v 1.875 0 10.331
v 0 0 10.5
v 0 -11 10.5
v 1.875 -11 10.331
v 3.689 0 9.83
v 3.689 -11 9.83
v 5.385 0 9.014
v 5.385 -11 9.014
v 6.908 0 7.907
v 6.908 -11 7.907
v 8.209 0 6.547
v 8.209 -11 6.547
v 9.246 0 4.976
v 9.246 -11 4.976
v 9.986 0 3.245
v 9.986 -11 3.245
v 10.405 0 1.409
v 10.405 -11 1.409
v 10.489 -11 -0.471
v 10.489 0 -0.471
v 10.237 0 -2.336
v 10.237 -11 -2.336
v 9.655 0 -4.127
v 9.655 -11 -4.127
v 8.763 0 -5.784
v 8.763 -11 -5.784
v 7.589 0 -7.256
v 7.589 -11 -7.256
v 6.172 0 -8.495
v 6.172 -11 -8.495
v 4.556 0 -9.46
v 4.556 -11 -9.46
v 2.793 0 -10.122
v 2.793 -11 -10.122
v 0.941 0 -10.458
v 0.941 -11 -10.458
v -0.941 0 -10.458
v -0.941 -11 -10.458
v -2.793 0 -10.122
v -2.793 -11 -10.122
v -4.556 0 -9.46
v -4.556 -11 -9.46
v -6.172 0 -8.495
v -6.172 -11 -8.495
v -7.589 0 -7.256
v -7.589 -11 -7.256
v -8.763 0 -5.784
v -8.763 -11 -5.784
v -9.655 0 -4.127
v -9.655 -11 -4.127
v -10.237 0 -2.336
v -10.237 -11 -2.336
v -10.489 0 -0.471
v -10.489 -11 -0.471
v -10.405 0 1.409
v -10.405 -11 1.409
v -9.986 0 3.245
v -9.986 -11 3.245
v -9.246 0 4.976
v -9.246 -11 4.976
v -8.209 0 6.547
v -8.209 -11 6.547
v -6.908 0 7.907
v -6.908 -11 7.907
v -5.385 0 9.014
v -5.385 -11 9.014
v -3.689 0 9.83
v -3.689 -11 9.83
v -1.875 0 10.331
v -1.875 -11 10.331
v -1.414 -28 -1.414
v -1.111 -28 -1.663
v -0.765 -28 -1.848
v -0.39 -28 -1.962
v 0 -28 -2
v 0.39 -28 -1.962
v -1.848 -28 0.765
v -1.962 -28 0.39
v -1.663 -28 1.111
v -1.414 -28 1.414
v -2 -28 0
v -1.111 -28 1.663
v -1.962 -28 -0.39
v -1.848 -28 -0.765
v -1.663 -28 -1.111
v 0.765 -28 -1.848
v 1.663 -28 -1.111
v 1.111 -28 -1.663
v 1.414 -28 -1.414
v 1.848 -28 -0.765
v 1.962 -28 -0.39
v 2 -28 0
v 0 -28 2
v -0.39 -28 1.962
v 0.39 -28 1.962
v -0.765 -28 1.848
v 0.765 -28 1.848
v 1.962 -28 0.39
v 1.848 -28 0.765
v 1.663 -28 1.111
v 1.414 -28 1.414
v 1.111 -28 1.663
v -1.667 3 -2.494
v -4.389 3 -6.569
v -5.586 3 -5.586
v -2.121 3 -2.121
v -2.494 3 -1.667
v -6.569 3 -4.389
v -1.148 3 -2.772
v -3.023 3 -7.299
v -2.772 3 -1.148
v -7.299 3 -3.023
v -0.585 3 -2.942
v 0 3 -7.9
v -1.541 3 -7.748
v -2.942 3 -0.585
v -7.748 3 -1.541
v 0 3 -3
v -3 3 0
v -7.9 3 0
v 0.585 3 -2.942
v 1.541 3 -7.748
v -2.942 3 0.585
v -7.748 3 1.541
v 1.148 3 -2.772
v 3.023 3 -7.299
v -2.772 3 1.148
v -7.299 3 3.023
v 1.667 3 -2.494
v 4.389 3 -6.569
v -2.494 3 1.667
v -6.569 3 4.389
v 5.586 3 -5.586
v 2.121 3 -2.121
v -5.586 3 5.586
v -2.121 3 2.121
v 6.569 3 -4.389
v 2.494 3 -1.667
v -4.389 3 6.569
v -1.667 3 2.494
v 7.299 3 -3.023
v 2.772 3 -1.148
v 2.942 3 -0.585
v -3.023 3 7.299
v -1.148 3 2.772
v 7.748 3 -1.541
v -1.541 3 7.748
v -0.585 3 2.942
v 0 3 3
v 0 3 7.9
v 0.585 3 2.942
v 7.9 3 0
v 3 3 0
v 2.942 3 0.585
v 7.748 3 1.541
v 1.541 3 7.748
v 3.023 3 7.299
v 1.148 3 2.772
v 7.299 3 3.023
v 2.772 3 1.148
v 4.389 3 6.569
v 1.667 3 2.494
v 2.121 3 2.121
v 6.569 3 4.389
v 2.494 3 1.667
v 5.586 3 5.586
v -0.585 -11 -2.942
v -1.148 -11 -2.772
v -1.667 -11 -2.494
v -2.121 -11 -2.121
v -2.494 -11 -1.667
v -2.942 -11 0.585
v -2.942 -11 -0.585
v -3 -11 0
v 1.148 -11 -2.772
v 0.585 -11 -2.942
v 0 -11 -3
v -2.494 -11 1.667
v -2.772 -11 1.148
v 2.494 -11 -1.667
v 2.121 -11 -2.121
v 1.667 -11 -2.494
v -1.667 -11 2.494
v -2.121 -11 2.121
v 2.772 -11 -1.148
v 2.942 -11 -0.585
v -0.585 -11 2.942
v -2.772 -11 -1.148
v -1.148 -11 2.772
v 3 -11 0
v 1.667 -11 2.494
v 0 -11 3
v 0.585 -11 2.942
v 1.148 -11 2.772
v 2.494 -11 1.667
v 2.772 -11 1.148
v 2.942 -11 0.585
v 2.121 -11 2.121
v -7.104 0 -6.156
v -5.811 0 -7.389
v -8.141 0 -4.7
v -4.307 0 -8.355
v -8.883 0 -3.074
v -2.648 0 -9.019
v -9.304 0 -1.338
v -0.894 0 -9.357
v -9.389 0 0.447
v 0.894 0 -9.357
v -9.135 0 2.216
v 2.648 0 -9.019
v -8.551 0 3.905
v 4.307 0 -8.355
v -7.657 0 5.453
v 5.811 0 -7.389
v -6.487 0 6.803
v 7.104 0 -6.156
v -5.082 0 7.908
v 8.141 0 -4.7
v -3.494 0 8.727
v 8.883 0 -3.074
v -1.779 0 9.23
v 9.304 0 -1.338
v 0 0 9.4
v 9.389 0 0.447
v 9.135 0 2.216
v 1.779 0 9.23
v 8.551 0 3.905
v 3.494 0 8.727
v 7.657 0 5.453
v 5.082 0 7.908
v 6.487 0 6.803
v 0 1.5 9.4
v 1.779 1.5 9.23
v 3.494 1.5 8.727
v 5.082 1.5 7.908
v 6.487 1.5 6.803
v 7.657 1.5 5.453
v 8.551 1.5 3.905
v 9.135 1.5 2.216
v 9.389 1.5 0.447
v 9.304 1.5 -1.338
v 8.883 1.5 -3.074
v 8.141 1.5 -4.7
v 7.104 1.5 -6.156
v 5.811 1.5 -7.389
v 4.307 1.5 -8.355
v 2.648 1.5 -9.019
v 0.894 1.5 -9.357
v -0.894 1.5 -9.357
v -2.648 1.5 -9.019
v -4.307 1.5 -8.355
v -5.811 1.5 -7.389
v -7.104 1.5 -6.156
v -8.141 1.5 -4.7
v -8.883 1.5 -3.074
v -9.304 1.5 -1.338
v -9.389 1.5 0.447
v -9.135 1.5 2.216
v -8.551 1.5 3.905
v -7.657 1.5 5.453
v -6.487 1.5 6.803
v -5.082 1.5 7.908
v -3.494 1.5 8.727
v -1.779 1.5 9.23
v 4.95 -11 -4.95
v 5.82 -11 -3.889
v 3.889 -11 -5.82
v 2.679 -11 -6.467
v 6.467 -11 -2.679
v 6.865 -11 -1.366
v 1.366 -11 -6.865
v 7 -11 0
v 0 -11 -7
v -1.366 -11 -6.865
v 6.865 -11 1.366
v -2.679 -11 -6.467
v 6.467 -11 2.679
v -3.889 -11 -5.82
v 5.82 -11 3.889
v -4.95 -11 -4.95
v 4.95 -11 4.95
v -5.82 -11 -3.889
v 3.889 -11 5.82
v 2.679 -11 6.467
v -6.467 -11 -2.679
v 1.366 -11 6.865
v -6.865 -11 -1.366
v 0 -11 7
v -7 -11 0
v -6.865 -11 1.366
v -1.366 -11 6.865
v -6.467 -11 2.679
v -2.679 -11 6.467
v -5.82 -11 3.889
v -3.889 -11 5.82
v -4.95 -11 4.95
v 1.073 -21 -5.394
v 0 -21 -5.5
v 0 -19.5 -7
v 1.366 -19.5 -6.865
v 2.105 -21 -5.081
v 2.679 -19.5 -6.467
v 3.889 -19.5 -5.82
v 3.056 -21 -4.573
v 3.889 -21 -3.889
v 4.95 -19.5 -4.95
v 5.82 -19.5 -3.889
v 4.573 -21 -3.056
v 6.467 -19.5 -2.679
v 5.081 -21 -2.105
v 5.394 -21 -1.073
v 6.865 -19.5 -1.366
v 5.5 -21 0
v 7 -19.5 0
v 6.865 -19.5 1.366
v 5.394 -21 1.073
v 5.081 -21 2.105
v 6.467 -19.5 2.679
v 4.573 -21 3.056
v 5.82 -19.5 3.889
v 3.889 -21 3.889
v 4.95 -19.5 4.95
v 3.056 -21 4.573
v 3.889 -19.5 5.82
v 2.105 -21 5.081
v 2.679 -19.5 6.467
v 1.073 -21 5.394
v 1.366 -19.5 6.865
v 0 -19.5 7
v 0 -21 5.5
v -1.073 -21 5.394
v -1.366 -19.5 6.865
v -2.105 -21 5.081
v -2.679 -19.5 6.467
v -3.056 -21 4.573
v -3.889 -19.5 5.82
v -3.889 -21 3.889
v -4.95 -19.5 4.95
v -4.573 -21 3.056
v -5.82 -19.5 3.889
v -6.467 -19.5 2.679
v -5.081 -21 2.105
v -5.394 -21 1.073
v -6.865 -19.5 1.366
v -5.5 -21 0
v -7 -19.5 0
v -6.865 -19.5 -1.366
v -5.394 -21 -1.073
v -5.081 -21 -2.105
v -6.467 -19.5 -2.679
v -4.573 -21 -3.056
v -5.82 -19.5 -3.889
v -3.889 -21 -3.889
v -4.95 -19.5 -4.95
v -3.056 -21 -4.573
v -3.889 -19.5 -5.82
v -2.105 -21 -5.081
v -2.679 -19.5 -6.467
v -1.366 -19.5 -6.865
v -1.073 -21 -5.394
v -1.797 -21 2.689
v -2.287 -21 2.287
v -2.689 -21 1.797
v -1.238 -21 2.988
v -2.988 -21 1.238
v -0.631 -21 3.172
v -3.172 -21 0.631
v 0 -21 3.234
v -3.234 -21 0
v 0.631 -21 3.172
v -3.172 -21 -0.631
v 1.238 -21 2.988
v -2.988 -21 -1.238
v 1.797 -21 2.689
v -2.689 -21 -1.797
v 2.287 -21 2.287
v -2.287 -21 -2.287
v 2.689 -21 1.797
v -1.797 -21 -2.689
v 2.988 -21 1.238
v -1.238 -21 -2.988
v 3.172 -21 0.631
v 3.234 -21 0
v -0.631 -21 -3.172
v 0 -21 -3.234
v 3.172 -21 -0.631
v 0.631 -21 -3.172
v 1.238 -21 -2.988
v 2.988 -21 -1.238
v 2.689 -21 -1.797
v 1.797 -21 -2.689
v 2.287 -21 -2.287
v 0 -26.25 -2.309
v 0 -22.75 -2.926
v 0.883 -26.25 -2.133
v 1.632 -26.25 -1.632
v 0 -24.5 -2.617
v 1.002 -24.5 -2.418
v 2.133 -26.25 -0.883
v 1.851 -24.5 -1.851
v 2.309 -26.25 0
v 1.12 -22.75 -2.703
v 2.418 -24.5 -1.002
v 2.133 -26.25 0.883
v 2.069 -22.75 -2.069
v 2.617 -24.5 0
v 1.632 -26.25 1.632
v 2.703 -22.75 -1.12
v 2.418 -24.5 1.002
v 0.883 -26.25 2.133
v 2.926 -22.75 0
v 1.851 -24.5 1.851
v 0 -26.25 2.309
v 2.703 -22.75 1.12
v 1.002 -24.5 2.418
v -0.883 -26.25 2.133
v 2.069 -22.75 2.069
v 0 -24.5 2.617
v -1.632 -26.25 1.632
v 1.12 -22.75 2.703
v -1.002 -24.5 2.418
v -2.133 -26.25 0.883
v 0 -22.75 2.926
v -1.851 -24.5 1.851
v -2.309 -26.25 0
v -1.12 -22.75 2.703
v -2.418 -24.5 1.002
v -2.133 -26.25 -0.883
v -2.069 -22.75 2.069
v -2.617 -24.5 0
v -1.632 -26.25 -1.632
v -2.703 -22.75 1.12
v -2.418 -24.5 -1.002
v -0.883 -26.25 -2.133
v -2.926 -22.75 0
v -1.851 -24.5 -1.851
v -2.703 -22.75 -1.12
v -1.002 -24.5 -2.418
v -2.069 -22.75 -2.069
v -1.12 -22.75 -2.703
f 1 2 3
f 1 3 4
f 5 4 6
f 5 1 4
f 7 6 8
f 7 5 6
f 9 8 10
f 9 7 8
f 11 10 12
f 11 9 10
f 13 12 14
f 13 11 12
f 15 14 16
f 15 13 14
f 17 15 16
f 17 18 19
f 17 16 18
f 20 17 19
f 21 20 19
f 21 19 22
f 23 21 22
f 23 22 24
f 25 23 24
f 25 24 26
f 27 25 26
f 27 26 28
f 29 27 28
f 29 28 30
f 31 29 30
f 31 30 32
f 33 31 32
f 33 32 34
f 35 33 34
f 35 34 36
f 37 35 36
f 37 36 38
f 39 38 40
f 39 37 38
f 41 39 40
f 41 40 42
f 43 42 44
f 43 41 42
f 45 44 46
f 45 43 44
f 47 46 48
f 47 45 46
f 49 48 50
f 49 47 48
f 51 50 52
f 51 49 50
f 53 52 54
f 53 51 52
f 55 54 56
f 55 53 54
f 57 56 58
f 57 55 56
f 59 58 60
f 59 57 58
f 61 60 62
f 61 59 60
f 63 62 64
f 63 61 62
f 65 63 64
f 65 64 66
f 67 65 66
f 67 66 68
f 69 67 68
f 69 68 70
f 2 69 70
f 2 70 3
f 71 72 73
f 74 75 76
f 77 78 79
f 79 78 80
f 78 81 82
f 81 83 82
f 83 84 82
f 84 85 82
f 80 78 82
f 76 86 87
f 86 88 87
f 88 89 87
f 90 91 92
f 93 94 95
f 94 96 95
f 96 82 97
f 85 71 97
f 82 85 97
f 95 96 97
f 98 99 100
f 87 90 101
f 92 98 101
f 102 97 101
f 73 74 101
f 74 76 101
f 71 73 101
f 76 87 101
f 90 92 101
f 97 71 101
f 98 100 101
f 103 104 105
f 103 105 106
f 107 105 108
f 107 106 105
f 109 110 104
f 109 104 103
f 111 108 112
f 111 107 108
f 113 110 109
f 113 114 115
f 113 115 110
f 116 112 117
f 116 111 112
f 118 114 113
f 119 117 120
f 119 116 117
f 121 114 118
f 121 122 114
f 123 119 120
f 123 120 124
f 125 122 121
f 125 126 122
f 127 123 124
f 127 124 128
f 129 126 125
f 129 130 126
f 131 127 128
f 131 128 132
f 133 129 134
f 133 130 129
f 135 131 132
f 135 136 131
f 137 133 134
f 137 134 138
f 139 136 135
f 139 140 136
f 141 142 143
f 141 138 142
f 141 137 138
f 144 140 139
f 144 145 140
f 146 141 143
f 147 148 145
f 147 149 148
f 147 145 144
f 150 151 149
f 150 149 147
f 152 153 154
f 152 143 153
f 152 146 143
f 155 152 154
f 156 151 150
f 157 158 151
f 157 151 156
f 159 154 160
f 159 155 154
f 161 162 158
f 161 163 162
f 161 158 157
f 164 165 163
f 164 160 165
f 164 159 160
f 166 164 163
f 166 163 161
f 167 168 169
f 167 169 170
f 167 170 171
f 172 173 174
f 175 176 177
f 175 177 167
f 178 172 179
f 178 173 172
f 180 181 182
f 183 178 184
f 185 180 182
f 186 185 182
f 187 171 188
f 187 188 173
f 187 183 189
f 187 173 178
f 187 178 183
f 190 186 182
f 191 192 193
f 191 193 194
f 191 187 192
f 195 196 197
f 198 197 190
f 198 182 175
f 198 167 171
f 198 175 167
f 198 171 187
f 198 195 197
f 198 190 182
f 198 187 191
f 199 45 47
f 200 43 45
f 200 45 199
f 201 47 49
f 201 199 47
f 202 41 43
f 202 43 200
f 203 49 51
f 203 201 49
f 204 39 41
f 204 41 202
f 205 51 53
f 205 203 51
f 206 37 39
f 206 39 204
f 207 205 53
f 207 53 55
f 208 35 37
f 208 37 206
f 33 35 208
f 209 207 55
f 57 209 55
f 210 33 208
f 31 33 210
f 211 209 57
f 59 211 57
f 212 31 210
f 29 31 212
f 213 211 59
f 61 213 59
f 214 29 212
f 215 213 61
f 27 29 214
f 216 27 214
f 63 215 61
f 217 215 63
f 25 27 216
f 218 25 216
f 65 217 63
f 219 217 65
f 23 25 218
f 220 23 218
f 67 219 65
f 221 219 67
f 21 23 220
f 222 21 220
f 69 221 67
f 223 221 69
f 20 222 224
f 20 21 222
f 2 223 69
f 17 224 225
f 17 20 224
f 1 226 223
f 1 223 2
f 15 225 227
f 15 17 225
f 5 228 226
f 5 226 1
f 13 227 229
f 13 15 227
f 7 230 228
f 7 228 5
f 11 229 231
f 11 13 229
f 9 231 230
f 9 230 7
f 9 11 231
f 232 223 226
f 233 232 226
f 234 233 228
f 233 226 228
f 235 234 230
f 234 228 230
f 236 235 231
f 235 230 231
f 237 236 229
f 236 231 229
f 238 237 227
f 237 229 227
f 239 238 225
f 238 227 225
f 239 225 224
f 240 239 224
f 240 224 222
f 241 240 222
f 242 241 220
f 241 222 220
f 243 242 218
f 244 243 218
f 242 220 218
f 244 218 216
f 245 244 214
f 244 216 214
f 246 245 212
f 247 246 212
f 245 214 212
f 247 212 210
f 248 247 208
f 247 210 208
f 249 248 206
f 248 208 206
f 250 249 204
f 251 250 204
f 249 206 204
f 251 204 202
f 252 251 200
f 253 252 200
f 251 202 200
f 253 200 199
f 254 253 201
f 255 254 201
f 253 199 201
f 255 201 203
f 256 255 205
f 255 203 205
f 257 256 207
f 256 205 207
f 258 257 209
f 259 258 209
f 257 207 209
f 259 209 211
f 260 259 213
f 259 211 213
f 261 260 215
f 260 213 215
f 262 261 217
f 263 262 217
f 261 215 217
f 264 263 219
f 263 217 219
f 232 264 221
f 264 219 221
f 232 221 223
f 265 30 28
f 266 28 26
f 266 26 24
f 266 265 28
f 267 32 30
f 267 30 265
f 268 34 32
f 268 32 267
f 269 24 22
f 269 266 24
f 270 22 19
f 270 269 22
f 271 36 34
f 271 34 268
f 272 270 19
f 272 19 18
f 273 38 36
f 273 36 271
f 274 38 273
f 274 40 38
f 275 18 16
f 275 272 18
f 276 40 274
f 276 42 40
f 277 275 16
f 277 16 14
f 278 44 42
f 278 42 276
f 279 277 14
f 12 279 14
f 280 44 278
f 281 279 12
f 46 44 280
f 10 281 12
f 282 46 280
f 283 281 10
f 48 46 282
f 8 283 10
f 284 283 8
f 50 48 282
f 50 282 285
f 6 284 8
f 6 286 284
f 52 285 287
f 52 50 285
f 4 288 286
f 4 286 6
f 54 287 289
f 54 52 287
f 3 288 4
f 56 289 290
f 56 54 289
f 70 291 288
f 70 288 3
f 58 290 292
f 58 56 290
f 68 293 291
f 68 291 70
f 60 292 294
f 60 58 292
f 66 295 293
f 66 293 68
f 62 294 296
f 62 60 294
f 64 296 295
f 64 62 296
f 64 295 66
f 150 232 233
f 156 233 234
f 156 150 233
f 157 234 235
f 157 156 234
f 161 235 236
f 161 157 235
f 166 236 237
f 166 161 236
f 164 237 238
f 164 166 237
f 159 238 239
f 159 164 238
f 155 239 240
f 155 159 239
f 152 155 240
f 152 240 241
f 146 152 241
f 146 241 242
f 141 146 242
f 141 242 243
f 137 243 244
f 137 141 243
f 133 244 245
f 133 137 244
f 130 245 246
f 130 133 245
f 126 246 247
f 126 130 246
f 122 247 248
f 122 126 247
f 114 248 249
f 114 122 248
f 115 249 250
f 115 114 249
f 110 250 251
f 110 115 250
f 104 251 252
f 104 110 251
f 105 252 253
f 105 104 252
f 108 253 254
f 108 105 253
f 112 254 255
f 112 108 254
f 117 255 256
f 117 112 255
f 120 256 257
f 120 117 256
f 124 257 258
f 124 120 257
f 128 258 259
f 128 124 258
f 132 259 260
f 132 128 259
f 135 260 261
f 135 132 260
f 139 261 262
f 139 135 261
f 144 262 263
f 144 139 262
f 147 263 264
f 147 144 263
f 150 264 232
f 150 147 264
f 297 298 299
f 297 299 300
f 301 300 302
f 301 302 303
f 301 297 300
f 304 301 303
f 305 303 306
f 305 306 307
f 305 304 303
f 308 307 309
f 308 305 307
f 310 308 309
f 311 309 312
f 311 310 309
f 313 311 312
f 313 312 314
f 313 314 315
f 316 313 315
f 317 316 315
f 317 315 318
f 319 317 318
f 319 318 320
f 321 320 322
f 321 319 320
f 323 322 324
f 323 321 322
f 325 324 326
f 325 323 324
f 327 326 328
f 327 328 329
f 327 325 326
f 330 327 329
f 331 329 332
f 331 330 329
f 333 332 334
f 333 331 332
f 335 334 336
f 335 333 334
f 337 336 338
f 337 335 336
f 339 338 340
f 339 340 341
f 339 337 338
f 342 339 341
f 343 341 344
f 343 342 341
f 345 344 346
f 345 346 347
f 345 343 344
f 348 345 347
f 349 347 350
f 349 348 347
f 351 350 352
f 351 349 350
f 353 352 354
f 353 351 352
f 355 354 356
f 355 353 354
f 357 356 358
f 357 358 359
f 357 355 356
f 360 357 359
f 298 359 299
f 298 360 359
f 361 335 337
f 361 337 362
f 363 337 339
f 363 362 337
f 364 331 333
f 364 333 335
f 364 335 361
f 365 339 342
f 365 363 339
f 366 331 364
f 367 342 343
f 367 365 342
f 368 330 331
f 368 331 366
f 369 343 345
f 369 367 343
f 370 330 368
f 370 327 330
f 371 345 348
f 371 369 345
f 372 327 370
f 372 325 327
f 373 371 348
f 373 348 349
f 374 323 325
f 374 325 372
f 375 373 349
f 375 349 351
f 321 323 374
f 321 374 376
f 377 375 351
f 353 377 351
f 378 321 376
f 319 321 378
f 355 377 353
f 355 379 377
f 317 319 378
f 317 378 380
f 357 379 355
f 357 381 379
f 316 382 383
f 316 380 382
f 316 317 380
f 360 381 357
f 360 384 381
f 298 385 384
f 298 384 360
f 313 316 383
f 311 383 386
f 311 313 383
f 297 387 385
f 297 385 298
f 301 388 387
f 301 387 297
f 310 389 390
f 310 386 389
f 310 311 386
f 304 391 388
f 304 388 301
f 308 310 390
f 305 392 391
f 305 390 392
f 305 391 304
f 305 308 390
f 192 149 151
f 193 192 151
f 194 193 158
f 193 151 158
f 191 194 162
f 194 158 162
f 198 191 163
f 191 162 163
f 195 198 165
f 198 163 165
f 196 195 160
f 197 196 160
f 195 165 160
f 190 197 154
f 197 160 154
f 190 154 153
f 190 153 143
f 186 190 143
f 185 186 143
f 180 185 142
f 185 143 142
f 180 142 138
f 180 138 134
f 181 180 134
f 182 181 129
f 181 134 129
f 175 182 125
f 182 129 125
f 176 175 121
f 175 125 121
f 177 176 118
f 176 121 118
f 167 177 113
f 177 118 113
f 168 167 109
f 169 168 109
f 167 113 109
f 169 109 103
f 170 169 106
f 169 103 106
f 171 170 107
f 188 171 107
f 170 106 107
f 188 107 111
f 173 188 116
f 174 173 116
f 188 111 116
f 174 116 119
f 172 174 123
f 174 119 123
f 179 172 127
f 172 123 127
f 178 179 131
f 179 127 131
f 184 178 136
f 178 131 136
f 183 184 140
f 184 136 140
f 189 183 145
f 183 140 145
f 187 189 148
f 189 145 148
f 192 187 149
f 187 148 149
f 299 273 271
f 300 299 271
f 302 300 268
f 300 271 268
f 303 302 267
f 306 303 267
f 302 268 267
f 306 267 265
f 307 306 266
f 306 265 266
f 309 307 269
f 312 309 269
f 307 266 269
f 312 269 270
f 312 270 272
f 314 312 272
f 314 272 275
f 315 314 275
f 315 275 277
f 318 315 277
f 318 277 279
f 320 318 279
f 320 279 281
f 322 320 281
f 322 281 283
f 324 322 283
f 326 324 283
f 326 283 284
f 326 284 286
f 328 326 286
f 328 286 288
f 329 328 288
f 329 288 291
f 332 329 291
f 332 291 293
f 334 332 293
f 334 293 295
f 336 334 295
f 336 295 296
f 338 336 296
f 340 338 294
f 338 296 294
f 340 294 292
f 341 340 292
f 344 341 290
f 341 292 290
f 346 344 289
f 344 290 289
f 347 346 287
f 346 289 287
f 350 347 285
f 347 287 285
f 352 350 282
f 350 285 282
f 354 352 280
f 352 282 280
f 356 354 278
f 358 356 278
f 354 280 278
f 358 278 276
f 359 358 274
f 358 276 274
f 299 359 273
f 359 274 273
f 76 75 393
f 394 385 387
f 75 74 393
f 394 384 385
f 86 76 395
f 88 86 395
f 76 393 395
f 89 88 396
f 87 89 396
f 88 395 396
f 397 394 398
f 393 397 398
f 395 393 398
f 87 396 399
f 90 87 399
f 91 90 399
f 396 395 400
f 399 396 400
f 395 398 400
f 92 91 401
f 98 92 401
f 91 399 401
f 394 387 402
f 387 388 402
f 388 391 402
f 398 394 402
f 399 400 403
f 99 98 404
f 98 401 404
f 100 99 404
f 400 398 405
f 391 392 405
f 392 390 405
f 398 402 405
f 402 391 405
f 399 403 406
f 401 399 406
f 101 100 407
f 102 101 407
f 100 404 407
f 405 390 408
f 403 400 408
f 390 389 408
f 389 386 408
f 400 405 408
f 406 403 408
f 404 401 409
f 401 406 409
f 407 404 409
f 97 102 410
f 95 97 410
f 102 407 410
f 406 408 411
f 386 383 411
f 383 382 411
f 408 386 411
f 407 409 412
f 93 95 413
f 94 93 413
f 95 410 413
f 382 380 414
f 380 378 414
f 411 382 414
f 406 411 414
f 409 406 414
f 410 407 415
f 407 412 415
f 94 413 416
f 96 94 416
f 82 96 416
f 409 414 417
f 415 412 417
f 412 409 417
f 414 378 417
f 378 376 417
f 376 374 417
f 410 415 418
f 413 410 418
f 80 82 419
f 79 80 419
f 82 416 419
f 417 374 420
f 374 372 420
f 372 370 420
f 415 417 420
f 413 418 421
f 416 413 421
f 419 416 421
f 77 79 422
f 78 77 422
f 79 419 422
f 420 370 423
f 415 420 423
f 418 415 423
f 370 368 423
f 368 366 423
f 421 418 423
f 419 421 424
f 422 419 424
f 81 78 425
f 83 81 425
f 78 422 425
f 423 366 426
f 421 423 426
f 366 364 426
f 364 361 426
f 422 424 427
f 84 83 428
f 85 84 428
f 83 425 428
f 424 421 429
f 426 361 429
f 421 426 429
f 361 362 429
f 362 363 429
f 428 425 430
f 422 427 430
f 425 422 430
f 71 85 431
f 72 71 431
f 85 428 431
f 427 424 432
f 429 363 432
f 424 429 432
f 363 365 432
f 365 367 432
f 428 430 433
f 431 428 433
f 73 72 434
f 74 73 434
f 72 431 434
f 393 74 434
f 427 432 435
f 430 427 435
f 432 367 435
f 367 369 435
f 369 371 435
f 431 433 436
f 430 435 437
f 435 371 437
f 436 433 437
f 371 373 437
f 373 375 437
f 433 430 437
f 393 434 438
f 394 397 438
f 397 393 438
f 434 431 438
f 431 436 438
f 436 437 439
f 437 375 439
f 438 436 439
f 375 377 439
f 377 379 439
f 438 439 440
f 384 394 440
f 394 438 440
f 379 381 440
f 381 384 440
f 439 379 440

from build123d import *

# Parameters (mm, degrees)
SKETCH_1_R          = 10.5
EXTRUDE_1_DEPTH     = 28
SKETCH_4_R          = 9.4
EXTRUDE_3_DEPTH     = 3
CHAMFER_2_SIZE      = 1.5
SKETCH_5_R          = 3
CUT_EXTRUDE_2_DEPTH = 14
CUT_EXTRUDE_START   = -17
SKETCH_6_R          = 10.5
SKETCH_6_R_2        = 7
CUT_EXTRUDE_3_DEPTH = 17
CUT_EXTRUDE_START_2 = -7
SKETCH_7_R          = 7
SKETCH_7_R_2        = 2
CUT_EXTRUDE_4_DEPTH = 7
CHAMFER_3_SIZE      = 1.5
DRAFT_3_ANGLE       = 10


with BuildPart() as part:
    # Эскиз1 → Бобышка-Вытянуть1 (new body)
    with BuildSketch(Plane(origin=(0, 0, 0), x_dir=(1, 0, 0), z_dir=(0, 1, 0))):
        with Locations(Location((0, 0, 0), (0, 0, 270))):
            Circle(SKETCH_1_R)
    extrude(amount=-EXTRUDE_1_DEPTH)

    # Эскиз4 → Бобышка-Вытянуть3 (add)
    with BuildSketch(Plane(origin=(0, 0, 0), x_dir=(1, 0, 0), z_dir=(0, 1, 0))):
        with Locations(Location((0, 0, 0), (0, 0, 270))):
            Circle(SKETCH_4_R)
    extrude(amount=EXTRUDE_3_DEPTH)

    # Фаска2
    chamfer_2_edges = [part.edges().sort_by_distance(p)[0] for p in [
        (0, 3, -9.4),
    ]]
    chamfer(chamfer_2_edges, length=CHAMFER_2_SIZE)

    # Эскиз5 → Вырез-Вытянуть2 (cut)
    with BuildSketch(Plane(origin=(0, 3, 0), x_dir=(1, 0, 0), z_dir=(0, 1, 0))):
        with Locations(Location((0, 0, 0), (0, 0, 270))):
            Circle(SKETCH_5_R)
    extrude(amount=-CUT_EXTRUDE_2_DEPTH, mode=Mode.SUBTRACT)

    # Эскиз6 → Вырез-Вытянуть3 (cut)
    with BuildSketch(Plane.XZ.offset(28).offset(CUT_EXTRUDE_START)):
        with Locations(Location((0, 0, 0), (0, 0, 90))):
            Circle(SKETCH_6_R)
        with Locations(Location((0, 0, 0), (0, 0, 270))):
            Circle(SKETCH_6_R_2, mode=Mode.SUBTRACT)
    extrude(amount=CUT_EXTRUDE_3_DEPTH, mode=Mode.SUBTRACT)

    # Эскиз7 → Вырез-Вытянуть4 (cut)
    with BuildSketch(Plane.XZ.offset(28).offset(CUT_EXTRUDE_START_2)):
        with Locations(Location((0, 0, 0), (0, 0, 270))):
            Circle(SKETCH_7_R)
        with Locations(Location((0, 0, 0), (0, 0, 270))):
            Circle(SKETCH_7_R_2, mode=Mode.SUBTRACT)
    extrude(amount=CUT_EXTRUDE_4_DEPTH, mode=Mode.SUBTRACT)

    # Фаска3
    chamfer_3_edges = [part.edges().sort_by_distance(p)[0] for p in [
        (0, -21, 7),
    ]]
    chamfer(chamfer_3_edges, length=CHAMFER_3_SIZE)

    # Уклон3
    draft_3_faces = [part.faces().sort_by_distance(p)[0] for p in [
        (0, -24.5, 2),
    ]]
    draft(draft_3_faces, Plane(origin=(0, -28, 0), x_dir=(0, 0, -1), z_dir=(0, -1, 0)), DRAFT_3_ANGLE)


solid = part.part
